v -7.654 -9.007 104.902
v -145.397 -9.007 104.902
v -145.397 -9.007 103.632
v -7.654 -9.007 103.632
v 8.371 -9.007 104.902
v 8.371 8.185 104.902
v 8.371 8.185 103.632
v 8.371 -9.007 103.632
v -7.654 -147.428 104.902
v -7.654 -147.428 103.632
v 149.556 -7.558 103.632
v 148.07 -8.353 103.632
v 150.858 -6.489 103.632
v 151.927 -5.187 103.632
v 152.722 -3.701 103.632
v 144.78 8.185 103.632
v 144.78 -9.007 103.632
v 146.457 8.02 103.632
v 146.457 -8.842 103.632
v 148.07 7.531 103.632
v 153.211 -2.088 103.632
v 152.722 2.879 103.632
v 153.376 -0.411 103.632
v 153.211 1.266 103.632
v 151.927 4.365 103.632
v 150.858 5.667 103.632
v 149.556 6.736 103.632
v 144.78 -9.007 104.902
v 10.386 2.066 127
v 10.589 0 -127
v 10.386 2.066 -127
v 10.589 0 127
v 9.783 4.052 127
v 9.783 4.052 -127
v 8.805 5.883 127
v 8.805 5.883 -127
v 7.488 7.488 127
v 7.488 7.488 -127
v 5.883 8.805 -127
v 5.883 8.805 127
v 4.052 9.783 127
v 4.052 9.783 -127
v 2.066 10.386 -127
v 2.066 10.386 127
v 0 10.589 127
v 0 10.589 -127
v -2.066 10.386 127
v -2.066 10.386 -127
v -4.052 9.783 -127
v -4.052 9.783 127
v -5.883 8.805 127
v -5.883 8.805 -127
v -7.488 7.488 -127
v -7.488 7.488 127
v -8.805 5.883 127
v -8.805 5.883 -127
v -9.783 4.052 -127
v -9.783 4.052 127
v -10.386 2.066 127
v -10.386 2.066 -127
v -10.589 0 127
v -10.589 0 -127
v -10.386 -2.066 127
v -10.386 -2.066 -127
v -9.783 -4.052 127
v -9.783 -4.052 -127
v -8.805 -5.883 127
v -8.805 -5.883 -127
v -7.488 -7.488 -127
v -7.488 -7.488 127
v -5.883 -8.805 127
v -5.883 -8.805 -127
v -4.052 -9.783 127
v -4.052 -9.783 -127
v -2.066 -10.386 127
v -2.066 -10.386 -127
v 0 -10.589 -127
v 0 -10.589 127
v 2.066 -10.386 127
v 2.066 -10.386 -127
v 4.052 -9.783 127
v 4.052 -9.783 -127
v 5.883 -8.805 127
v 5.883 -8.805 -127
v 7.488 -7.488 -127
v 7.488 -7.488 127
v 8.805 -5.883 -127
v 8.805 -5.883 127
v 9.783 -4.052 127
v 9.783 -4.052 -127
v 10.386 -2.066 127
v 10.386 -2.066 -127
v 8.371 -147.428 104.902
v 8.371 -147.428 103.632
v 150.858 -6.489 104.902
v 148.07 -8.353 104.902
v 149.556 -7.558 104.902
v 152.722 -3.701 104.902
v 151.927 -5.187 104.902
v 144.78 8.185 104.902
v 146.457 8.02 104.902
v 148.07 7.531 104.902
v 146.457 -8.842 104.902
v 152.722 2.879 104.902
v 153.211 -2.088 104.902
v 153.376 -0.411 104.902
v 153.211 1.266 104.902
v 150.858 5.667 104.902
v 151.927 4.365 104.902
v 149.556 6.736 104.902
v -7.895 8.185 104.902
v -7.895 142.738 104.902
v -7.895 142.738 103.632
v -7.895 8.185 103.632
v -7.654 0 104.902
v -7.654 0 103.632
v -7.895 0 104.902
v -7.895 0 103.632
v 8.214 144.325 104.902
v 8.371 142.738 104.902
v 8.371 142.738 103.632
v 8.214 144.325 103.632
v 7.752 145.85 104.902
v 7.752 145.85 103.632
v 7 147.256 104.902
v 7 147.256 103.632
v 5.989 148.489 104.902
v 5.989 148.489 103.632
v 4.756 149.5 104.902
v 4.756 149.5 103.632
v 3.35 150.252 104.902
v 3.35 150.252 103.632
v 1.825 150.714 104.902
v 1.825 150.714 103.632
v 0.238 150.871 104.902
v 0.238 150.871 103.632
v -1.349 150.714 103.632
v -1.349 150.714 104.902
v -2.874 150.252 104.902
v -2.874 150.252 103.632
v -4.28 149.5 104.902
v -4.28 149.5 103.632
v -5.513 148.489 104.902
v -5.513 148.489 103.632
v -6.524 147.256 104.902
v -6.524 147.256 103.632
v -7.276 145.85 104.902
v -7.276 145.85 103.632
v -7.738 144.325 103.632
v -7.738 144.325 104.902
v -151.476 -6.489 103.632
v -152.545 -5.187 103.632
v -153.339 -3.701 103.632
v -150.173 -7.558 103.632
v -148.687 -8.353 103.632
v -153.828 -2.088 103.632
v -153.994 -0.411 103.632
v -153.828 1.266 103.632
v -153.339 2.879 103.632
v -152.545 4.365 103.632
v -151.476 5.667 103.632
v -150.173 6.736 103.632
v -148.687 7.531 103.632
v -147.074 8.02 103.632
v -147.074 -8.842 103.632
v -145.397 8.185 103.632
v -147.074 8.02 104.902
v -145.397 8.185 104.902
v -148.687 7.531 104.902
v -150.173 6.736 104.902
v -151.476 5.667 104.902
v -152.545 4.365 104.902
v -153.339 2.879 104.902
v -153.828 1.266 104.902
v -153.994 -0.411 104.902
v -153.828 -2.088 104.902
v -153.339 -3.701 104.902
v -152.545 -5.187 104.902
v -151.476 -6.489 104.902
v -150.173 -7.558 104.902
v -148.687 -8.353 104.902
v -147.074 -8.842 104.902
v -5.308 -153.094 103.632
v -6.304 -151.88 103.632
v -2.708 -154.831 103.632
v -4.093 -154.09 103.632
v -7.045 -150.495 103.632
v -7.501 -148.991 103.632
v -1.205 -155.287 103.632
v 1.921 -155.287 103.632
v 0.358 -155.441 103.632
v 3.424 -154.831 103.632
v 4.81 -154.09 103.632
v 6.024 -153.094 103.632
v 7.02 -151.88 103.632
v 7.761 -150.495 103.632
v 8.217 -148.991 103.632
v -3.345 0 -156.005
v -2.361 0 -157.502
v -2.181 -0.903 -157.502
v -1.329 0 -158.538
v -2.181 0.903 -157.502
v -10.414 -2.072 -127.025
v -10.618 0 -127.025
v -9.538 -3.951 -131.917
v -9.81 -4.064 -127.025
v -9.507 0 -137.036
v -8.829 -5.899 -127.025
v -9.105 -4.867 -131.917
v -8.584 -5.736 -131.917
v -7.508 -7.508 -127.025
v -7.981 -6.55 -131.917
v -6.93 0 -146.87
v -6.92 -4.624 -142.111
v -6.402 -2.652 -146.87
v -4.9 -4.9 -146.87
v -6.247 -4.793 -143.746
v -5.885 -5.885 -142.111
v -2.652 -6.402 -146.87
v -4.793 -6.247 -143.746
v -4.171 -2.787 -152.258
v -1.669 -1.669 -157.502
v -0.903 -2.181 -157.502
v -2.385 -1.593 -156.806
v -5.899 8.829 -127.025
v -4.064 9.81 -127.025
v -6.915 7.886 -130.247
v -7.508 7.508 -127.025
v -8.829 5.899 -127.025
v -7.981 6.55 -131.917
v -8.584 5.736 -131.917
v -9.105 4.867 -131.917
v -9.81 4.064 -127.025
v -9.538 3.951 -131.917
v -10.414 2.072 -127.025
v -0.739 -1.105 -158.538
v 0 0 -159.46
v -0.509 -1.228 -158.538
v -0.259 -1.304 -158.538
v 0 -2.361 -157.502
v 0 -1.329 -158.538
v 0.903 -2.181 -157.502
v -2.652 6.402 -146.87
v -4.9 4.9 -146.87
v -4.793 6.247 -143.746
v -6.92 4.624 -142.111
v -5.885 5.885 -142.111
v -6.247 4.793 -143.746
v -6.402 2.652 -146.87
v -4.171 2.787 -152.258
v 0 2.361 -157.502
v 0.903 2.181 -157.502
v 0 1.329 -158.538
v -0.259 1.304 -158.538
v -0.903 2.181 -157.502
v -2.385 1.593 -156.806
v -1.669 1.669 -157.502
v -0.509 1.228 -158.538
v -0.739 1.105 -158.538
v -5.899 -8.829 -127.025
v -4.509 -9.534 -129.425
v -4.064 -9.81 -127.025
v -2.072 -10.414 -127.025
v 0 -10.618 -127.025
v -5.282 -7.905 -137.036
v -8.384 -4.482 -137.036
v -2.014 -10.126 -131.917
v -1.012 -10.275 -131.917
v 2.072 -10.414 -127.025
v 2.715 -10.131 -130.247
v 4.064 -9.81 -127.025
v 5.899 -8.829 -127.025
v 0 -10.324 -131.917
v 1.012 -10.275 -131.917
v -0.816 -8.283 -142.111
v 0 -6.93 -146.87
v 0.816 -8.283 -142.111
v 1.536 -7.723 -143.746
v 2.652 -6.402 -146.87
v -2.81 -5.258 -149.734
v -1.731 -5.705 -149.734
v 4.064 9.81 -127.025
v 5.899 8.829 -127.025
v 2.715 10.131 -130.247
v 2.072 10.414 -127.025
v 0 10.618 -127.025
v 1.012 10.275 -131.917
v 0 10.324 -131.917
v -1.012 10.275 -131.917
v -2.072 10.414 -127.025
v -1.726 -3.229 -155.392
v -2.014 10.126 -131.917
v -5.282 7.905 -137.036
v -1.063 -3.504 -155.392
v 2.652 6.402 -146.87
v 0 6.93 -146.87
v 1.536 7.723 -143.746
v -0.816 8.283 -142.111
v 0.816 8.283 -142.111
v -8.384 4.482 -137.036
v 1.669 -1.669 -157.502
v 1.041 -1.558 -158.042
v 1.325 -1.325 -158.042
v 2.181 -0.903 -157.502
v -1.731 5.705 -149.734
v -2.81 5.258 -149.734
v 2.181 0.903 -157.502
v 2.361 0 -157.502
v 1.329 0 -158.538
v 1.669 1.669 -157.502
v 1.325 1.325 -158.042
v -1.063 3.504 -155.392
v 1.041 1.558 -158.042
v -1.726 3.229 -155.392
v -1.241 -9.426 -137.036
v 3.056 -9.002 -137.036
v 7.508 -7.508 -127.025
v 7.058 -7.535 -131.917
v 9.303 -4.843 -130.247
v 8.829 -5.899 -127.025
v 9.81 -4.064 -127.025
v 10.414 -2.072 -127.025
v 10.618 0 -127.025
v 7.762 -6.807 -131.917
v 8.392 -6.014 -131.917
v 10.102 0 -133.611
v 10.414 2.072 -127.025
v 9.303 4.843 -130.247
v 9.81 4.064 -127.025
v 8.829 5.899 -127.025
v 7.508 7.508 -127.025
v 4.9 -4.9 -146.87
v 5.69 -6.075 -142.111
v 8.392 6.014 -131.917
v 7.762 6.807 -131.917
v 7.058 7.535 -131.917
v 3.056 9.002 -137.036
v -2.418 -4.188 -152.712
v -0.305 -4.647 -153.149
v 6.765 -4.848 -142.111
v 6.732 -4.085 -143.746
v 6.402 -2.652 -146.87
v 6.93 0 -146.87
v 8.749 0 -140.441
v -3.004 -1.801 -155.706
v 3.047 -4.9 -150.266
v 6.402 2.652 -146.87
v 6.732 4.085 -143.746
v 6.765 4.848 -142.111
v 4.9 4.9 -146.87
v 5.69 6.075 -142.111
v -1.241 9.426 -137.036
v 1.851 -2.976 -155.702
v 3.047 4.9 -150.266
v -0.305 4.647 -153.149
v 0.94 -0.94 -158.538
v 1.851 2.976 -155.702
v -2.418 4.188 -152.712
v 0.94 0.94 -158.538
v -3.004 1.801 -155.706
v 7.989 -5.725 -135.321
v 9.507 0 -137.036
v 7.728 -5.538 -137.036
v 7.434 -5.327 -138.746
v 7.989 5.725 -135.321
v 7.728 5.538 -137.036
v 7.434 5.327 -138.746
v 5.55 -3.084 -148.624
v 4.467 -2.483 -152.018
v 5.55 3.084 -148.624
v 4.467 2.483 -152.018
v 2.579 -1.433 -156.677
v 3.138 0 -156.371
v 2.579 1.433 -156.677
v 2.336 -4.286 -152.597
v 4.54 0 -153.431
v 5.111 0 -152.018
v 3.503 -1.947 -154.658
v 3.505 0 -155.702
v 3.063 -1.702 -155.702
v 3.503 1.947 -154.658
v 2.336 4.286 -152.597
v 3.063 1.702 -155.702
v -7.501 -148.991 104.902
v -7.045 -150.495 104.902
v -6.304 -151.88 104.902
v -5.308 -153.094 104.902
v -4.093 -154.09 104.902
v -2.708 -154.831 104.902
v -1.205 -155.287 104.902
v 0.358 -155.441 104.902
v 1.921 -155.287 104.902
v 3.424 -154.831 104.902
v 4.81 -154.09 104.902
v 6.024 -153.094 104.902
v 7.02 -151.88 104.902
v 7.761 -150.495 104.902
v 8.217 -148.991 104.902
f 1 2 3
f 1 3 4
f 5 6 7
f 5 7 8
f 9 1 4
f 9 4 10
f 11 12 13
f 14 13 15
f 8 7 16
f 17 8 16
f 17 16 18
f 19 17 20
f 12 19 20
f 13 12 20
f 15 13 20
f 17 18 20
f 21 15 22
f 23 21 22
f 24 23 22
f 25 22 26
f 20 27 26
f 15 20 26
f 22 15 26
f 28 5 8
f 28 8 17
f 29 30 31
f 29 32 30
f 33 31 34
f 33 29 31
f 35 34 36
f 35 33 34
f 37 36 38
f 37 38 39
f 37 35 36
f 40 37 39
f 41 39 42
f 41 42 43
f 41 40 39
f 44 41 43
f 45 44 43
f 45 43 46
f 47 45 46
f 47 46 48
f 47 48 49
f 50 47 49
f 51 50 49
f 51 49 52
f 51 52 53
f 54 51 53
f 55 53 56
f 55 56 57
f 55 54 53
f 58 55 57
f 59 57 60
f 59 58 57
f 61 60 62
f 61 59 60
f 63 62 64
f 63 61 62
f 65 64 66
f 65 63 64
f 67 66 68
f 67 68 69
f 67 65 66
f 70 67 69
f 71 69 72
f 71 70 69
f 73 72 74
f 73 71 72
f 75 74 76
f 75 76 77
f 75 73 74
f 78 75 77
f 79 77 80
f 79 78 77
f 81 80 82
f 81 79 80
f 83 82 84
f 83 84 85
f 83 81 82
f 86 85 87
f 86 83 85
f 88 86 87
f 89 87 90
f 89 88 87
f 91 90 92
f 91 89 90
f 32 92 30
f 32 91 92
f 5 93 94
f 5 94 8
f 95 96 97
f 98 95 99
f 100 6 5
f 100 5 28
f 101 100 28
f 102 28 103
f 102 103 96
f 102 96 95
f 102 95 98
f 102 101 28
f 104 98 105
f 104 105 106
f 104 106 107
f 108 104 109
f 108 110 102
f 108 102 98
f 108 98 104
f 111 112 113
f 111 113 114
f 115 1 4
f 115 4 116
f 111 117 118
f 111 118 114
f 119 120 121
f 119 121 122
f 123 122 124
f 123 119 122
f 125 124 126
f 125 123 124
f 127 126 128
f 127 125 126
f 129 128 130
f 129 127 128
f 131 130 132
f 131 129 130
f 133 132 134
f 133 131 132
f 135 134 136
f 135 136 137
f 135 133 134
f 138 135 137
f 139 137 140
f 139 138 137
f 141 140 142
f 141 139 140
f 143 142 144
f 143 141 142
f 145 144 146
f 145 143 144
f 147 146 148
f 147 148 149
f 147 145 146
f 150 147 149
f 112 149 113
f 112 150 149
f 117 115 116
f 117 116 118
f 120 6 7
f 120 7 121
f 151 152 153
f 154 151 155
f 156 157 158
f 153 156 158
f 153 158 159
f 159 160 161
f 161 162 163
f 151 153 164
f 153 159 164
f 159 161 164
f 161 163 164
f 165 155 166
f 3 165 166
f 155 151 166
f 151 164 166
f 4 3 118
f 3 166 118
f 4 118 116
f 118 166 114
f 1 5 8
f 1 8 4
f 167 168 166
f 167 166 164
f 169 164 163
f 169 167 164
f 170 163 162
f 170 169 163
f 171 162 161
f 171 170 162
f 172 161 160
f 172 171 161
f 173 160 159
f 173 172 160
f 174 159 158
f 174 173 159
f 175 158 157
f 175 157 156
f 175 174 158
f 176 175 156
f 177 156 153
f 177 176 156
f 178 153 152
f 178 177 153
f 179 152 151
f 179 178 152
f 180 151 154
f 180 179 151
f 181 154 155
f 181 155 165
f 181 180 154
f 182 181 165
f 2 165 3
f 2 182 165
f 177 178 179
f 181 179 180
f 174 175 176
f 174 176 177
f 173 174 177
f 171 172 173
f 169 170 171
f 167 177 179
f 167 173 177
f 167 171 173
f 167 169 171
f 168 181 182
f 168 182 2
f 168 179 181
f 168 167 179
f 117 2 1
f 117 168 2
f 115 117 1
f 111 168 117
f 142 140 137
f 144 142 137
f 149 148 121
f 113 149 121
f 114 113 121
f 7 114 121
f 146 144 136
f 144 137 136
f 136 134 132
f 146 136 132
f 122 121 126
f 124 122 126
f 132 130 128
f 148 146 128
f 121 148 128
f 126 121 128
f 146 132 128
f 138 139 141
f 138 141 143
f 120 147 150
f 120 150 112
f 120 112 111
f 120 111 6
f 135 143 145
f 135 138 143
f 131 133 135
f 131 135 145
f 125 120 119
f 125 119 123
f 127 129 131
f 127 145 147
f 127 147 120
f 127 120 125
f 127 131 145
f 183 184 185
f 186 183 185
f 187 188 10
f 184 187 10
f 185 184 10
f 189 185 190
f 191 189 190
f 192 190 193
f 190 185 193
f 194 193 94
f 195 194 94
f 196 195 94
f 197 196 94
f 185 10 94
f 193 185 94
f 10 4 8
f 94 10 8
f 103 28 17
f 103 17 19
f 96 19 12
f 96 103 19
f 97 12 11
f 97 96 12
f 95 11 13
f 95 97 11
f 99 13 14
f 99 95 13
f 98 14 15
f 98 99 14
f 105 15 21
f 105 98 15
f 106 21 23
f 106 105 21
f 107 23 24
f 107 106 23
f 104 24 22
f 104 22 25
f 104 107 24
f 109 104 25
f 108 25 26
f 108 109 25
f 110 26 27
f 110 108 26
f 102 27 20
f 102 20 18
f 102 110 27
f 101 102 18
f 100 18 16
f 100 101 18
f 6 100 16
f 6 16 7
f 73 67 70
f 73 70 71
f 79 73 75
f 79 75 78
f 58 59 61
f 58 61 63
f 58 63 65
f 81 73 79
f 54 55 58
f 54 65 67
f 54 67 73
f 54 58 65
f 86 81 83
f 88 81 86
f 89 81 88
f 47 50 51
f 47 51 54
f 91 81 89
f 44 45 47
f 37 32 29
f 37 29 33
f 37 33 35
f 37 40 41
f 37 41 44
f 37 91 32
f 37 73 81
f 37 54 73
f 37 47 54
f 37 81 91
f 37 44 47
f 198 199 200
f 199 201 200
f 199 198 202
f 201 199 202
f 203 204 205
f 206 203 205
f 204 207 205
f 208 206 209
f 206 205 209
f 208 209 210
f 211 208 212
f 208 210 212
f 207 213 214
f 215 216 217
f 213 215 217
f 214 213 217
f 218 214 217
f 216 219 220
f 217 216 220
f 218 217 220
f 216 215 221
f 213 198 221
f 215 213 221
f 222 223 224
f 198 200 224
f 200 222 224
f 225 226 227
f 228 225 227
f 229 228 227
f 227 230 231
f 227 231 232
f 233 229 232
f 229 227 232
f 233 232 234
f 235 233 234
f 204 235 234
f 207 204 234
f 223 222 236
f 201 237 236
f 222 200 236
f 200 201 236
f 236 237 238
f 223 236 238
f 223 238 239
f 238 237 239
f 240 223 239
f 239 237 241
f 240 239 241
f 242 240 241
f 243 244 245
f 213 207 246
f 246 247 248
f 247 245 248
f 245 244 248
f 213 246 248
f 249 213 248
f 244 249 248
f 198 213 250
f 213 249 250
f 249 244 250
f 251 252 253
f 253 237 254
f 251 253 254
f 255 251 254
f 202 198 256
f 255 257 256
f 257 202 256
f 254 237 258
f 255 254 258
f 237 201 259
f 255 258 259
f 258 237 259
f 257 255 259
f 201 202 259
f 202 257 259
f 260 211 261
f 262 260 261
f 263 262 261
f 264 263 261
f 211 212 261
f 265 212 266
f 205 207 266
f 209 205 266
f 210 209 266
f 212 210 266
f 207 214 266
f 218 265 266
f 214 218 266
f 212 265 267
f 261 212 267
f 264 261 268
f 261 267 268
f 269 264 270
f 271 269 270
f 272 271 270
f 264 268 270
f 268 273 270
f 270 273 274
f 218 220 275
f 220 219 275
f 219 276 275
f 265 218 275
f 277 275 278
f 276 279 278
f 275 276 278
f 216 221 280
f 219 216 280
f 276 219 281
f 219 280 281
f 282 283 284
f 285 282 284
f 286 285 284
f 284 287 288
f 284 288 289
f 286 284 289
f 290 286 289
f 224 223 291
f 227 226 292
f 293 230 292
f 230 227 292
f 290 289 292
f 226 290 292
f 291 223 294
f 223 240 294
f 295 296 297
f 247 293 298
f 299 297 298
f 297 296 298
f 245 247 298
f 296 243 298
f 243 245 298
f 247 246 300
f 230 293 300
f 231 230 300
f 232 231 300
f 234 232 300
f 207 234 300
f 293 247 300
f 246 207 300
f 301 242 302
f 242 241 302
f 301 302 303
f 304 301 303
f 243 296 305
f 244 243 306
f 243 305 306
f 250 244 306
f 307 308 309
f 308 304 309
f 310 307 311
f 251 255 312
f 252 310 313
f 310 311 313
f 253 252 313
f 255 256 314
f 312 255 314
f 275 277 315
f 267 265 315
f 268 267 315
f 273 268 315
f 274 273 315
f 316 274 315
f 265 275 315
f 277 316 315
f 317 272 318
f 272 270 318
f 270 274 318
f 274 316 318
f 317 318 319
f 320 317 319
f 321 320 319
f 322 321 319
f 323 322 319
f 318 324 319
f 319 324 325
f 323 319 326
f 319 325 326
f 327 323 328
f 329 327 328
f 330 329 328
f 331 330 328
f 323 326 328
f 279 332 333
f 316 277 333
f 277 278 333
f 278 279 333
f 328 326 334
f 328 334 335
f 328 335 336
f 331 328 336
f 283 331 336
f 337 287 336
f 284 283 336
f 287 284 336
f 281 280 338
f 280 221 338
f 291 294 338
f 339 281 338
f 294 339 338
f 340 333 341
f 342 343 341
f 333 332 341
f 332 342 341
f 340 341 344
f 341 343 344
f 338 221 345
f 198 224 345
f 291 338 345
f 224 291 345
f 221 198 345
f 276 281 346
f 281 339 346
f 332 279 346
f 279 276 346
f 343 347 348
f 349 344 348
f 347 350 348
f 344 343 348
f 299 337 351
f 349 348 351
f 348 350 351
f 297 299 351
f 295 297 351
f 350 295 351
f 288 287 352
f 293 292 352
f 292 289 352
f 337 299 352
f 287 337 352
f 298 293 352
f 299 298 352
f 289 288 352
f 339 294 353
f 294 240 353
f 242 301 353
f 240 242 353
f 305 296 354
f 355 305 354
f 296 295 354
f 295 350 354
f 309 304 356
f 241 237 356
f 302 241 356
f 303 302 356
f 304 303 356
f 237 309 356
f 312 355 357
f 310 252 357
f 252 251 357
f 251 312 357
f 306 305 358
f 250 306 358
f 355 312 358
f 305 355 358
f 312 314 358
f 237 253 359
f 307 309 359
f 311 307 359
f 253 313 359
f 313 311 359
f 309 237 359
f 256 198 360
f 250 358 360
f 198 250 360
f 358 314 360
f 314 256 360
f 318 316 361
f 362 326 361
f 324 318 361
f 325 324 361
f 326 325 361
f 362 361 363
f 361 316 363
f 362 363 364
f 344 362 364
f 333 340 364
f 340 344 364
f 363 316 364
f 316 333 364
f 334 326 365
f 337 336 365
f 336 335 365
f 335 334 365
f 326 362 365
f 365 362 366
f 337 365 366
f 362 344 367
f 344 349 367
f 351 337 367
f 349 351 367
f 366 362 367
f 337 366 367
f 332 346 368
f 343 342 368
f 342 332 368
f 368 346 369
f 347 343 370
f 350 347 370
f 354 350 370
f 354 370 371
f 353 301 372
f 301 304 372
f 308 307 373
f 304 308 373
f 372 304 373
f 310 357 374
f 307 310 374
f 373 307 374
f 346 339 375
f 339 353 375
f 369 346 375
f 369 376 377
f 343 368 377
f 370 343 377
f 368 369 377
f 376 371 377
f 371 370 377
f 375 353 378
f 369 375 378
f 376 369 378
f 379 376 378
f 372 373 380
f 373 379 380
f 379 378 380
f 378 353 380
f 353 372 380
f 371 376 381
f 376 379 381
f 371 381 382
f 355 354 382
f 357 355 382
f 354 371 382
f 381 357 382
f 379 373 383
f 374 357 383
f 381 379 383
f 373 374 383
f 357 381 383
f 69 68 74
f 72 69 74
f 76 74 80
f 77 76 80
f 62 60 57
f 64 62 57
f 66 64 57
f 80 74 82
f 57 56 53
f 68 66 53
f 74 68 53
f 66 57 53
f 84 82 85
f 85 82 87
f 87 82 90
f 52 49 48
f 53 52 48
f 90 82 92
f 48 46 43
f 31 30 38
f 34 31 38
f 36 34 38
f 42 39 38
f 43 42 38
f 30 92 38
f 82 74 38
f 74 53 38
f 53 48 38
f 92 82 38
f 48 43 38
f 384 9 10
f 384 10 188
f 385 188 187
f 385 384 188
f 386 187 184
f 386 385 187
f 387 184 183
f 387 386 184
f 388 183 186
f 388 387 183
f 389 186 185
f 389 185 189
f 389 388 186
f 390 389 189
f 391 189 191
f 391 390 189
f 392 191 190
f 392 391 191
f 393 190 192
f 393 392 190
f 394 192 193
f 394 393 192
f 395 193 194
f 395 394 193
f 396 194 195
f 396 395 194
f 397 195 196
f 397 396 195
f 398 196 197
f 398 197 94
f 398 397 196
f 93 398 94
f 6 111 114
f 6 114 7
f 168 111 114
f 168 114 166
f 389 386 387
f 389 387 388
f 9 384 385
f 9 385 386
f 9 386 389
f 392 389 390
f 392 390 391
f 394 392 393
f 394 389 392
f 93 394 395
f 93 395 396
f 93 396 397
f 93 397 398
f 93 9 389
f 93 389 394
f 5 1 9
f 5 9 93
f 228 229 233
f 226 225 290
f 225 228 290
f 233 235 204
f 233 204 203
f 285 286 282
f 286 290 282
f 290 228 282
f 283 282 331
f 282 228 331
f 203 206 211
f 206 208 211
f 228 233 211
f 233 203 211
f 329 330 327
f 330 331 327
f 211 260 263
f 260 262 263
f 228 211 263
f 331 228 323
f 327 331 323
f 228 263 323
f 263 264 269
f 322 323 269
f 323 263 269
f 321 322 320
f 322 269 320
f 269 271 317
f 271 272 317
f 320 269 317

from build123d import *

# Parameters (mm, degrees)
F0_R     = 10.5891149713
F1_DEPTH = 127
F4_DEPTH = 1.27


with BuildPart() as f1:
    # F0 (on Top) → F1 (new body, symmetric)
    with BuildSketch(Plane.XY):
        Circle(F0_R)
    extrude(amount=F1_DEPTH, both=True)


with BuildPart() as f4:
    # F3 (on offset) → F4 (new body)
    with BuildSketch(Plane.XY.offset(104.902)):
        Polygon((-7.8947432339, 0), (-7.8947432339, 8.1851631403), (-145.3974545002, 8.1851631403), (-145.3974545002, -9.0071475133), (-7.654465735, -9.0071475133), (-7.654465735, 0), align=None)
        with BuildLine():
            Line((-145.3974545002, -9.0071475133), (-145.3974545002, 8.1851631403))
            ThreePointArc((-145.3974545002, 8.1851631403), (-153.993609827, -0.4109921865), (-145.3974545002, -9.0071475133))
        make_face()
    extrude(amount=-F4_DEPTH)


with BuildPart() as f4b:
    # F3 (on offset) → F4, piece 2 (new body)
    with BuildSketch(Plane.XY.offset(104.902)):
        Polygon((-0.617519021, 8.1851631403), (0, 8.1851631403), (8.3706863225, 8.1851631403), (8.3706863225, 142.7379101515), (-7.8947432339, 142.7379101515), (-7.8947432339, 8.1851631403), align=None)
        with BuildLine():
            Line((-7.8947432339, 142.7379101515), (8.3706863225, 142.7379101515))
            ThreePointArc((8.3706863225, 142.7379101515), (0.2379715443, 150.8706249297), (-7.8947432339, 142.7379101515))
        make_face()
    extrude(amount=-F4_DEPTH)


with BuildPart() as f4c:
    # F3 (on offset) → F4, piece 3 (new body)
    with BuildSketch(Plane.XY.offset(104.902)):
        Polygon((144.7799354792, 8.1851631403), (8.3706863225, 8.1851631403), (8.3706863225, 0), (8.3706863225, -9.0071475133), (144.7799354792, -9.0071475133), align=None)
        with BuildLine():
            ThreePointArc((144.7799354792, -9.0071475133), (153.376090806, -0.4109921865), (144.7799354792, 8.1851631403))
            Line((144.7799354792, 8.1851631403), (144.7799354792, -9.0071475133))
        make_face()
    extrude(amount=-F4_DEPTH)


with BuildPart() as f4d:
    # F3 (on offset) → F4, piece 4 (new body)
    with BuildSketch(Plane.XY.offset(104.902)):
        Polygon((8.3706863225, -9.0071475133), (0, -9.0071475133), (-0.617519021, -9.0071475133), (-7.654465735, -9.0071475133), (-7.654465735, -147.4282443523), (8.3706863225, -147.4282443523), align=None)
        with BuildLine():
            ThreePointArc((-7.654465735, -147.4282443523), (0.3581102937, -155.440820381), (8.3706863225, -147.4282443523))
            Line((8.3706863225, -147.4282443523), (-7.654465735, -147.4282443523))
        make_face()
    extrude(amount=-F4_DEPTH)


with BuildPart() as f6:
    # F5 (on Front) → F6 (revolve)
    with BuildSketch(Plane.XZ):
        with BuildLine():
            Line((0, -159.4596505165), (-10.6184864417, -127.0246952772))
            add(Edge.make_bspline(
                [(-10.6184864417, -127.0246952772), (-10.6576769925, -136.2831163712), (-4.7716083946, -154.4683316092), (-2.1387403831, -158.1834703684), (0, -159.4596505165)],
                knots=[0, 0, 0, 0, 0.6694131599, 1, 1, 1, 1], degree=3))
        make_face()
        Polygon((0, -159.4596505165), (0, -127.0246952772), (-10.6184864417, -127.0246952772), align=None)
    revolve(axis=Axis((0, 0, -143.2421728969), (0, 0, 1)))


solid = Compound([f1.part, f4.part, f4b.part, f4c.part, f4d.part, f6.part])
